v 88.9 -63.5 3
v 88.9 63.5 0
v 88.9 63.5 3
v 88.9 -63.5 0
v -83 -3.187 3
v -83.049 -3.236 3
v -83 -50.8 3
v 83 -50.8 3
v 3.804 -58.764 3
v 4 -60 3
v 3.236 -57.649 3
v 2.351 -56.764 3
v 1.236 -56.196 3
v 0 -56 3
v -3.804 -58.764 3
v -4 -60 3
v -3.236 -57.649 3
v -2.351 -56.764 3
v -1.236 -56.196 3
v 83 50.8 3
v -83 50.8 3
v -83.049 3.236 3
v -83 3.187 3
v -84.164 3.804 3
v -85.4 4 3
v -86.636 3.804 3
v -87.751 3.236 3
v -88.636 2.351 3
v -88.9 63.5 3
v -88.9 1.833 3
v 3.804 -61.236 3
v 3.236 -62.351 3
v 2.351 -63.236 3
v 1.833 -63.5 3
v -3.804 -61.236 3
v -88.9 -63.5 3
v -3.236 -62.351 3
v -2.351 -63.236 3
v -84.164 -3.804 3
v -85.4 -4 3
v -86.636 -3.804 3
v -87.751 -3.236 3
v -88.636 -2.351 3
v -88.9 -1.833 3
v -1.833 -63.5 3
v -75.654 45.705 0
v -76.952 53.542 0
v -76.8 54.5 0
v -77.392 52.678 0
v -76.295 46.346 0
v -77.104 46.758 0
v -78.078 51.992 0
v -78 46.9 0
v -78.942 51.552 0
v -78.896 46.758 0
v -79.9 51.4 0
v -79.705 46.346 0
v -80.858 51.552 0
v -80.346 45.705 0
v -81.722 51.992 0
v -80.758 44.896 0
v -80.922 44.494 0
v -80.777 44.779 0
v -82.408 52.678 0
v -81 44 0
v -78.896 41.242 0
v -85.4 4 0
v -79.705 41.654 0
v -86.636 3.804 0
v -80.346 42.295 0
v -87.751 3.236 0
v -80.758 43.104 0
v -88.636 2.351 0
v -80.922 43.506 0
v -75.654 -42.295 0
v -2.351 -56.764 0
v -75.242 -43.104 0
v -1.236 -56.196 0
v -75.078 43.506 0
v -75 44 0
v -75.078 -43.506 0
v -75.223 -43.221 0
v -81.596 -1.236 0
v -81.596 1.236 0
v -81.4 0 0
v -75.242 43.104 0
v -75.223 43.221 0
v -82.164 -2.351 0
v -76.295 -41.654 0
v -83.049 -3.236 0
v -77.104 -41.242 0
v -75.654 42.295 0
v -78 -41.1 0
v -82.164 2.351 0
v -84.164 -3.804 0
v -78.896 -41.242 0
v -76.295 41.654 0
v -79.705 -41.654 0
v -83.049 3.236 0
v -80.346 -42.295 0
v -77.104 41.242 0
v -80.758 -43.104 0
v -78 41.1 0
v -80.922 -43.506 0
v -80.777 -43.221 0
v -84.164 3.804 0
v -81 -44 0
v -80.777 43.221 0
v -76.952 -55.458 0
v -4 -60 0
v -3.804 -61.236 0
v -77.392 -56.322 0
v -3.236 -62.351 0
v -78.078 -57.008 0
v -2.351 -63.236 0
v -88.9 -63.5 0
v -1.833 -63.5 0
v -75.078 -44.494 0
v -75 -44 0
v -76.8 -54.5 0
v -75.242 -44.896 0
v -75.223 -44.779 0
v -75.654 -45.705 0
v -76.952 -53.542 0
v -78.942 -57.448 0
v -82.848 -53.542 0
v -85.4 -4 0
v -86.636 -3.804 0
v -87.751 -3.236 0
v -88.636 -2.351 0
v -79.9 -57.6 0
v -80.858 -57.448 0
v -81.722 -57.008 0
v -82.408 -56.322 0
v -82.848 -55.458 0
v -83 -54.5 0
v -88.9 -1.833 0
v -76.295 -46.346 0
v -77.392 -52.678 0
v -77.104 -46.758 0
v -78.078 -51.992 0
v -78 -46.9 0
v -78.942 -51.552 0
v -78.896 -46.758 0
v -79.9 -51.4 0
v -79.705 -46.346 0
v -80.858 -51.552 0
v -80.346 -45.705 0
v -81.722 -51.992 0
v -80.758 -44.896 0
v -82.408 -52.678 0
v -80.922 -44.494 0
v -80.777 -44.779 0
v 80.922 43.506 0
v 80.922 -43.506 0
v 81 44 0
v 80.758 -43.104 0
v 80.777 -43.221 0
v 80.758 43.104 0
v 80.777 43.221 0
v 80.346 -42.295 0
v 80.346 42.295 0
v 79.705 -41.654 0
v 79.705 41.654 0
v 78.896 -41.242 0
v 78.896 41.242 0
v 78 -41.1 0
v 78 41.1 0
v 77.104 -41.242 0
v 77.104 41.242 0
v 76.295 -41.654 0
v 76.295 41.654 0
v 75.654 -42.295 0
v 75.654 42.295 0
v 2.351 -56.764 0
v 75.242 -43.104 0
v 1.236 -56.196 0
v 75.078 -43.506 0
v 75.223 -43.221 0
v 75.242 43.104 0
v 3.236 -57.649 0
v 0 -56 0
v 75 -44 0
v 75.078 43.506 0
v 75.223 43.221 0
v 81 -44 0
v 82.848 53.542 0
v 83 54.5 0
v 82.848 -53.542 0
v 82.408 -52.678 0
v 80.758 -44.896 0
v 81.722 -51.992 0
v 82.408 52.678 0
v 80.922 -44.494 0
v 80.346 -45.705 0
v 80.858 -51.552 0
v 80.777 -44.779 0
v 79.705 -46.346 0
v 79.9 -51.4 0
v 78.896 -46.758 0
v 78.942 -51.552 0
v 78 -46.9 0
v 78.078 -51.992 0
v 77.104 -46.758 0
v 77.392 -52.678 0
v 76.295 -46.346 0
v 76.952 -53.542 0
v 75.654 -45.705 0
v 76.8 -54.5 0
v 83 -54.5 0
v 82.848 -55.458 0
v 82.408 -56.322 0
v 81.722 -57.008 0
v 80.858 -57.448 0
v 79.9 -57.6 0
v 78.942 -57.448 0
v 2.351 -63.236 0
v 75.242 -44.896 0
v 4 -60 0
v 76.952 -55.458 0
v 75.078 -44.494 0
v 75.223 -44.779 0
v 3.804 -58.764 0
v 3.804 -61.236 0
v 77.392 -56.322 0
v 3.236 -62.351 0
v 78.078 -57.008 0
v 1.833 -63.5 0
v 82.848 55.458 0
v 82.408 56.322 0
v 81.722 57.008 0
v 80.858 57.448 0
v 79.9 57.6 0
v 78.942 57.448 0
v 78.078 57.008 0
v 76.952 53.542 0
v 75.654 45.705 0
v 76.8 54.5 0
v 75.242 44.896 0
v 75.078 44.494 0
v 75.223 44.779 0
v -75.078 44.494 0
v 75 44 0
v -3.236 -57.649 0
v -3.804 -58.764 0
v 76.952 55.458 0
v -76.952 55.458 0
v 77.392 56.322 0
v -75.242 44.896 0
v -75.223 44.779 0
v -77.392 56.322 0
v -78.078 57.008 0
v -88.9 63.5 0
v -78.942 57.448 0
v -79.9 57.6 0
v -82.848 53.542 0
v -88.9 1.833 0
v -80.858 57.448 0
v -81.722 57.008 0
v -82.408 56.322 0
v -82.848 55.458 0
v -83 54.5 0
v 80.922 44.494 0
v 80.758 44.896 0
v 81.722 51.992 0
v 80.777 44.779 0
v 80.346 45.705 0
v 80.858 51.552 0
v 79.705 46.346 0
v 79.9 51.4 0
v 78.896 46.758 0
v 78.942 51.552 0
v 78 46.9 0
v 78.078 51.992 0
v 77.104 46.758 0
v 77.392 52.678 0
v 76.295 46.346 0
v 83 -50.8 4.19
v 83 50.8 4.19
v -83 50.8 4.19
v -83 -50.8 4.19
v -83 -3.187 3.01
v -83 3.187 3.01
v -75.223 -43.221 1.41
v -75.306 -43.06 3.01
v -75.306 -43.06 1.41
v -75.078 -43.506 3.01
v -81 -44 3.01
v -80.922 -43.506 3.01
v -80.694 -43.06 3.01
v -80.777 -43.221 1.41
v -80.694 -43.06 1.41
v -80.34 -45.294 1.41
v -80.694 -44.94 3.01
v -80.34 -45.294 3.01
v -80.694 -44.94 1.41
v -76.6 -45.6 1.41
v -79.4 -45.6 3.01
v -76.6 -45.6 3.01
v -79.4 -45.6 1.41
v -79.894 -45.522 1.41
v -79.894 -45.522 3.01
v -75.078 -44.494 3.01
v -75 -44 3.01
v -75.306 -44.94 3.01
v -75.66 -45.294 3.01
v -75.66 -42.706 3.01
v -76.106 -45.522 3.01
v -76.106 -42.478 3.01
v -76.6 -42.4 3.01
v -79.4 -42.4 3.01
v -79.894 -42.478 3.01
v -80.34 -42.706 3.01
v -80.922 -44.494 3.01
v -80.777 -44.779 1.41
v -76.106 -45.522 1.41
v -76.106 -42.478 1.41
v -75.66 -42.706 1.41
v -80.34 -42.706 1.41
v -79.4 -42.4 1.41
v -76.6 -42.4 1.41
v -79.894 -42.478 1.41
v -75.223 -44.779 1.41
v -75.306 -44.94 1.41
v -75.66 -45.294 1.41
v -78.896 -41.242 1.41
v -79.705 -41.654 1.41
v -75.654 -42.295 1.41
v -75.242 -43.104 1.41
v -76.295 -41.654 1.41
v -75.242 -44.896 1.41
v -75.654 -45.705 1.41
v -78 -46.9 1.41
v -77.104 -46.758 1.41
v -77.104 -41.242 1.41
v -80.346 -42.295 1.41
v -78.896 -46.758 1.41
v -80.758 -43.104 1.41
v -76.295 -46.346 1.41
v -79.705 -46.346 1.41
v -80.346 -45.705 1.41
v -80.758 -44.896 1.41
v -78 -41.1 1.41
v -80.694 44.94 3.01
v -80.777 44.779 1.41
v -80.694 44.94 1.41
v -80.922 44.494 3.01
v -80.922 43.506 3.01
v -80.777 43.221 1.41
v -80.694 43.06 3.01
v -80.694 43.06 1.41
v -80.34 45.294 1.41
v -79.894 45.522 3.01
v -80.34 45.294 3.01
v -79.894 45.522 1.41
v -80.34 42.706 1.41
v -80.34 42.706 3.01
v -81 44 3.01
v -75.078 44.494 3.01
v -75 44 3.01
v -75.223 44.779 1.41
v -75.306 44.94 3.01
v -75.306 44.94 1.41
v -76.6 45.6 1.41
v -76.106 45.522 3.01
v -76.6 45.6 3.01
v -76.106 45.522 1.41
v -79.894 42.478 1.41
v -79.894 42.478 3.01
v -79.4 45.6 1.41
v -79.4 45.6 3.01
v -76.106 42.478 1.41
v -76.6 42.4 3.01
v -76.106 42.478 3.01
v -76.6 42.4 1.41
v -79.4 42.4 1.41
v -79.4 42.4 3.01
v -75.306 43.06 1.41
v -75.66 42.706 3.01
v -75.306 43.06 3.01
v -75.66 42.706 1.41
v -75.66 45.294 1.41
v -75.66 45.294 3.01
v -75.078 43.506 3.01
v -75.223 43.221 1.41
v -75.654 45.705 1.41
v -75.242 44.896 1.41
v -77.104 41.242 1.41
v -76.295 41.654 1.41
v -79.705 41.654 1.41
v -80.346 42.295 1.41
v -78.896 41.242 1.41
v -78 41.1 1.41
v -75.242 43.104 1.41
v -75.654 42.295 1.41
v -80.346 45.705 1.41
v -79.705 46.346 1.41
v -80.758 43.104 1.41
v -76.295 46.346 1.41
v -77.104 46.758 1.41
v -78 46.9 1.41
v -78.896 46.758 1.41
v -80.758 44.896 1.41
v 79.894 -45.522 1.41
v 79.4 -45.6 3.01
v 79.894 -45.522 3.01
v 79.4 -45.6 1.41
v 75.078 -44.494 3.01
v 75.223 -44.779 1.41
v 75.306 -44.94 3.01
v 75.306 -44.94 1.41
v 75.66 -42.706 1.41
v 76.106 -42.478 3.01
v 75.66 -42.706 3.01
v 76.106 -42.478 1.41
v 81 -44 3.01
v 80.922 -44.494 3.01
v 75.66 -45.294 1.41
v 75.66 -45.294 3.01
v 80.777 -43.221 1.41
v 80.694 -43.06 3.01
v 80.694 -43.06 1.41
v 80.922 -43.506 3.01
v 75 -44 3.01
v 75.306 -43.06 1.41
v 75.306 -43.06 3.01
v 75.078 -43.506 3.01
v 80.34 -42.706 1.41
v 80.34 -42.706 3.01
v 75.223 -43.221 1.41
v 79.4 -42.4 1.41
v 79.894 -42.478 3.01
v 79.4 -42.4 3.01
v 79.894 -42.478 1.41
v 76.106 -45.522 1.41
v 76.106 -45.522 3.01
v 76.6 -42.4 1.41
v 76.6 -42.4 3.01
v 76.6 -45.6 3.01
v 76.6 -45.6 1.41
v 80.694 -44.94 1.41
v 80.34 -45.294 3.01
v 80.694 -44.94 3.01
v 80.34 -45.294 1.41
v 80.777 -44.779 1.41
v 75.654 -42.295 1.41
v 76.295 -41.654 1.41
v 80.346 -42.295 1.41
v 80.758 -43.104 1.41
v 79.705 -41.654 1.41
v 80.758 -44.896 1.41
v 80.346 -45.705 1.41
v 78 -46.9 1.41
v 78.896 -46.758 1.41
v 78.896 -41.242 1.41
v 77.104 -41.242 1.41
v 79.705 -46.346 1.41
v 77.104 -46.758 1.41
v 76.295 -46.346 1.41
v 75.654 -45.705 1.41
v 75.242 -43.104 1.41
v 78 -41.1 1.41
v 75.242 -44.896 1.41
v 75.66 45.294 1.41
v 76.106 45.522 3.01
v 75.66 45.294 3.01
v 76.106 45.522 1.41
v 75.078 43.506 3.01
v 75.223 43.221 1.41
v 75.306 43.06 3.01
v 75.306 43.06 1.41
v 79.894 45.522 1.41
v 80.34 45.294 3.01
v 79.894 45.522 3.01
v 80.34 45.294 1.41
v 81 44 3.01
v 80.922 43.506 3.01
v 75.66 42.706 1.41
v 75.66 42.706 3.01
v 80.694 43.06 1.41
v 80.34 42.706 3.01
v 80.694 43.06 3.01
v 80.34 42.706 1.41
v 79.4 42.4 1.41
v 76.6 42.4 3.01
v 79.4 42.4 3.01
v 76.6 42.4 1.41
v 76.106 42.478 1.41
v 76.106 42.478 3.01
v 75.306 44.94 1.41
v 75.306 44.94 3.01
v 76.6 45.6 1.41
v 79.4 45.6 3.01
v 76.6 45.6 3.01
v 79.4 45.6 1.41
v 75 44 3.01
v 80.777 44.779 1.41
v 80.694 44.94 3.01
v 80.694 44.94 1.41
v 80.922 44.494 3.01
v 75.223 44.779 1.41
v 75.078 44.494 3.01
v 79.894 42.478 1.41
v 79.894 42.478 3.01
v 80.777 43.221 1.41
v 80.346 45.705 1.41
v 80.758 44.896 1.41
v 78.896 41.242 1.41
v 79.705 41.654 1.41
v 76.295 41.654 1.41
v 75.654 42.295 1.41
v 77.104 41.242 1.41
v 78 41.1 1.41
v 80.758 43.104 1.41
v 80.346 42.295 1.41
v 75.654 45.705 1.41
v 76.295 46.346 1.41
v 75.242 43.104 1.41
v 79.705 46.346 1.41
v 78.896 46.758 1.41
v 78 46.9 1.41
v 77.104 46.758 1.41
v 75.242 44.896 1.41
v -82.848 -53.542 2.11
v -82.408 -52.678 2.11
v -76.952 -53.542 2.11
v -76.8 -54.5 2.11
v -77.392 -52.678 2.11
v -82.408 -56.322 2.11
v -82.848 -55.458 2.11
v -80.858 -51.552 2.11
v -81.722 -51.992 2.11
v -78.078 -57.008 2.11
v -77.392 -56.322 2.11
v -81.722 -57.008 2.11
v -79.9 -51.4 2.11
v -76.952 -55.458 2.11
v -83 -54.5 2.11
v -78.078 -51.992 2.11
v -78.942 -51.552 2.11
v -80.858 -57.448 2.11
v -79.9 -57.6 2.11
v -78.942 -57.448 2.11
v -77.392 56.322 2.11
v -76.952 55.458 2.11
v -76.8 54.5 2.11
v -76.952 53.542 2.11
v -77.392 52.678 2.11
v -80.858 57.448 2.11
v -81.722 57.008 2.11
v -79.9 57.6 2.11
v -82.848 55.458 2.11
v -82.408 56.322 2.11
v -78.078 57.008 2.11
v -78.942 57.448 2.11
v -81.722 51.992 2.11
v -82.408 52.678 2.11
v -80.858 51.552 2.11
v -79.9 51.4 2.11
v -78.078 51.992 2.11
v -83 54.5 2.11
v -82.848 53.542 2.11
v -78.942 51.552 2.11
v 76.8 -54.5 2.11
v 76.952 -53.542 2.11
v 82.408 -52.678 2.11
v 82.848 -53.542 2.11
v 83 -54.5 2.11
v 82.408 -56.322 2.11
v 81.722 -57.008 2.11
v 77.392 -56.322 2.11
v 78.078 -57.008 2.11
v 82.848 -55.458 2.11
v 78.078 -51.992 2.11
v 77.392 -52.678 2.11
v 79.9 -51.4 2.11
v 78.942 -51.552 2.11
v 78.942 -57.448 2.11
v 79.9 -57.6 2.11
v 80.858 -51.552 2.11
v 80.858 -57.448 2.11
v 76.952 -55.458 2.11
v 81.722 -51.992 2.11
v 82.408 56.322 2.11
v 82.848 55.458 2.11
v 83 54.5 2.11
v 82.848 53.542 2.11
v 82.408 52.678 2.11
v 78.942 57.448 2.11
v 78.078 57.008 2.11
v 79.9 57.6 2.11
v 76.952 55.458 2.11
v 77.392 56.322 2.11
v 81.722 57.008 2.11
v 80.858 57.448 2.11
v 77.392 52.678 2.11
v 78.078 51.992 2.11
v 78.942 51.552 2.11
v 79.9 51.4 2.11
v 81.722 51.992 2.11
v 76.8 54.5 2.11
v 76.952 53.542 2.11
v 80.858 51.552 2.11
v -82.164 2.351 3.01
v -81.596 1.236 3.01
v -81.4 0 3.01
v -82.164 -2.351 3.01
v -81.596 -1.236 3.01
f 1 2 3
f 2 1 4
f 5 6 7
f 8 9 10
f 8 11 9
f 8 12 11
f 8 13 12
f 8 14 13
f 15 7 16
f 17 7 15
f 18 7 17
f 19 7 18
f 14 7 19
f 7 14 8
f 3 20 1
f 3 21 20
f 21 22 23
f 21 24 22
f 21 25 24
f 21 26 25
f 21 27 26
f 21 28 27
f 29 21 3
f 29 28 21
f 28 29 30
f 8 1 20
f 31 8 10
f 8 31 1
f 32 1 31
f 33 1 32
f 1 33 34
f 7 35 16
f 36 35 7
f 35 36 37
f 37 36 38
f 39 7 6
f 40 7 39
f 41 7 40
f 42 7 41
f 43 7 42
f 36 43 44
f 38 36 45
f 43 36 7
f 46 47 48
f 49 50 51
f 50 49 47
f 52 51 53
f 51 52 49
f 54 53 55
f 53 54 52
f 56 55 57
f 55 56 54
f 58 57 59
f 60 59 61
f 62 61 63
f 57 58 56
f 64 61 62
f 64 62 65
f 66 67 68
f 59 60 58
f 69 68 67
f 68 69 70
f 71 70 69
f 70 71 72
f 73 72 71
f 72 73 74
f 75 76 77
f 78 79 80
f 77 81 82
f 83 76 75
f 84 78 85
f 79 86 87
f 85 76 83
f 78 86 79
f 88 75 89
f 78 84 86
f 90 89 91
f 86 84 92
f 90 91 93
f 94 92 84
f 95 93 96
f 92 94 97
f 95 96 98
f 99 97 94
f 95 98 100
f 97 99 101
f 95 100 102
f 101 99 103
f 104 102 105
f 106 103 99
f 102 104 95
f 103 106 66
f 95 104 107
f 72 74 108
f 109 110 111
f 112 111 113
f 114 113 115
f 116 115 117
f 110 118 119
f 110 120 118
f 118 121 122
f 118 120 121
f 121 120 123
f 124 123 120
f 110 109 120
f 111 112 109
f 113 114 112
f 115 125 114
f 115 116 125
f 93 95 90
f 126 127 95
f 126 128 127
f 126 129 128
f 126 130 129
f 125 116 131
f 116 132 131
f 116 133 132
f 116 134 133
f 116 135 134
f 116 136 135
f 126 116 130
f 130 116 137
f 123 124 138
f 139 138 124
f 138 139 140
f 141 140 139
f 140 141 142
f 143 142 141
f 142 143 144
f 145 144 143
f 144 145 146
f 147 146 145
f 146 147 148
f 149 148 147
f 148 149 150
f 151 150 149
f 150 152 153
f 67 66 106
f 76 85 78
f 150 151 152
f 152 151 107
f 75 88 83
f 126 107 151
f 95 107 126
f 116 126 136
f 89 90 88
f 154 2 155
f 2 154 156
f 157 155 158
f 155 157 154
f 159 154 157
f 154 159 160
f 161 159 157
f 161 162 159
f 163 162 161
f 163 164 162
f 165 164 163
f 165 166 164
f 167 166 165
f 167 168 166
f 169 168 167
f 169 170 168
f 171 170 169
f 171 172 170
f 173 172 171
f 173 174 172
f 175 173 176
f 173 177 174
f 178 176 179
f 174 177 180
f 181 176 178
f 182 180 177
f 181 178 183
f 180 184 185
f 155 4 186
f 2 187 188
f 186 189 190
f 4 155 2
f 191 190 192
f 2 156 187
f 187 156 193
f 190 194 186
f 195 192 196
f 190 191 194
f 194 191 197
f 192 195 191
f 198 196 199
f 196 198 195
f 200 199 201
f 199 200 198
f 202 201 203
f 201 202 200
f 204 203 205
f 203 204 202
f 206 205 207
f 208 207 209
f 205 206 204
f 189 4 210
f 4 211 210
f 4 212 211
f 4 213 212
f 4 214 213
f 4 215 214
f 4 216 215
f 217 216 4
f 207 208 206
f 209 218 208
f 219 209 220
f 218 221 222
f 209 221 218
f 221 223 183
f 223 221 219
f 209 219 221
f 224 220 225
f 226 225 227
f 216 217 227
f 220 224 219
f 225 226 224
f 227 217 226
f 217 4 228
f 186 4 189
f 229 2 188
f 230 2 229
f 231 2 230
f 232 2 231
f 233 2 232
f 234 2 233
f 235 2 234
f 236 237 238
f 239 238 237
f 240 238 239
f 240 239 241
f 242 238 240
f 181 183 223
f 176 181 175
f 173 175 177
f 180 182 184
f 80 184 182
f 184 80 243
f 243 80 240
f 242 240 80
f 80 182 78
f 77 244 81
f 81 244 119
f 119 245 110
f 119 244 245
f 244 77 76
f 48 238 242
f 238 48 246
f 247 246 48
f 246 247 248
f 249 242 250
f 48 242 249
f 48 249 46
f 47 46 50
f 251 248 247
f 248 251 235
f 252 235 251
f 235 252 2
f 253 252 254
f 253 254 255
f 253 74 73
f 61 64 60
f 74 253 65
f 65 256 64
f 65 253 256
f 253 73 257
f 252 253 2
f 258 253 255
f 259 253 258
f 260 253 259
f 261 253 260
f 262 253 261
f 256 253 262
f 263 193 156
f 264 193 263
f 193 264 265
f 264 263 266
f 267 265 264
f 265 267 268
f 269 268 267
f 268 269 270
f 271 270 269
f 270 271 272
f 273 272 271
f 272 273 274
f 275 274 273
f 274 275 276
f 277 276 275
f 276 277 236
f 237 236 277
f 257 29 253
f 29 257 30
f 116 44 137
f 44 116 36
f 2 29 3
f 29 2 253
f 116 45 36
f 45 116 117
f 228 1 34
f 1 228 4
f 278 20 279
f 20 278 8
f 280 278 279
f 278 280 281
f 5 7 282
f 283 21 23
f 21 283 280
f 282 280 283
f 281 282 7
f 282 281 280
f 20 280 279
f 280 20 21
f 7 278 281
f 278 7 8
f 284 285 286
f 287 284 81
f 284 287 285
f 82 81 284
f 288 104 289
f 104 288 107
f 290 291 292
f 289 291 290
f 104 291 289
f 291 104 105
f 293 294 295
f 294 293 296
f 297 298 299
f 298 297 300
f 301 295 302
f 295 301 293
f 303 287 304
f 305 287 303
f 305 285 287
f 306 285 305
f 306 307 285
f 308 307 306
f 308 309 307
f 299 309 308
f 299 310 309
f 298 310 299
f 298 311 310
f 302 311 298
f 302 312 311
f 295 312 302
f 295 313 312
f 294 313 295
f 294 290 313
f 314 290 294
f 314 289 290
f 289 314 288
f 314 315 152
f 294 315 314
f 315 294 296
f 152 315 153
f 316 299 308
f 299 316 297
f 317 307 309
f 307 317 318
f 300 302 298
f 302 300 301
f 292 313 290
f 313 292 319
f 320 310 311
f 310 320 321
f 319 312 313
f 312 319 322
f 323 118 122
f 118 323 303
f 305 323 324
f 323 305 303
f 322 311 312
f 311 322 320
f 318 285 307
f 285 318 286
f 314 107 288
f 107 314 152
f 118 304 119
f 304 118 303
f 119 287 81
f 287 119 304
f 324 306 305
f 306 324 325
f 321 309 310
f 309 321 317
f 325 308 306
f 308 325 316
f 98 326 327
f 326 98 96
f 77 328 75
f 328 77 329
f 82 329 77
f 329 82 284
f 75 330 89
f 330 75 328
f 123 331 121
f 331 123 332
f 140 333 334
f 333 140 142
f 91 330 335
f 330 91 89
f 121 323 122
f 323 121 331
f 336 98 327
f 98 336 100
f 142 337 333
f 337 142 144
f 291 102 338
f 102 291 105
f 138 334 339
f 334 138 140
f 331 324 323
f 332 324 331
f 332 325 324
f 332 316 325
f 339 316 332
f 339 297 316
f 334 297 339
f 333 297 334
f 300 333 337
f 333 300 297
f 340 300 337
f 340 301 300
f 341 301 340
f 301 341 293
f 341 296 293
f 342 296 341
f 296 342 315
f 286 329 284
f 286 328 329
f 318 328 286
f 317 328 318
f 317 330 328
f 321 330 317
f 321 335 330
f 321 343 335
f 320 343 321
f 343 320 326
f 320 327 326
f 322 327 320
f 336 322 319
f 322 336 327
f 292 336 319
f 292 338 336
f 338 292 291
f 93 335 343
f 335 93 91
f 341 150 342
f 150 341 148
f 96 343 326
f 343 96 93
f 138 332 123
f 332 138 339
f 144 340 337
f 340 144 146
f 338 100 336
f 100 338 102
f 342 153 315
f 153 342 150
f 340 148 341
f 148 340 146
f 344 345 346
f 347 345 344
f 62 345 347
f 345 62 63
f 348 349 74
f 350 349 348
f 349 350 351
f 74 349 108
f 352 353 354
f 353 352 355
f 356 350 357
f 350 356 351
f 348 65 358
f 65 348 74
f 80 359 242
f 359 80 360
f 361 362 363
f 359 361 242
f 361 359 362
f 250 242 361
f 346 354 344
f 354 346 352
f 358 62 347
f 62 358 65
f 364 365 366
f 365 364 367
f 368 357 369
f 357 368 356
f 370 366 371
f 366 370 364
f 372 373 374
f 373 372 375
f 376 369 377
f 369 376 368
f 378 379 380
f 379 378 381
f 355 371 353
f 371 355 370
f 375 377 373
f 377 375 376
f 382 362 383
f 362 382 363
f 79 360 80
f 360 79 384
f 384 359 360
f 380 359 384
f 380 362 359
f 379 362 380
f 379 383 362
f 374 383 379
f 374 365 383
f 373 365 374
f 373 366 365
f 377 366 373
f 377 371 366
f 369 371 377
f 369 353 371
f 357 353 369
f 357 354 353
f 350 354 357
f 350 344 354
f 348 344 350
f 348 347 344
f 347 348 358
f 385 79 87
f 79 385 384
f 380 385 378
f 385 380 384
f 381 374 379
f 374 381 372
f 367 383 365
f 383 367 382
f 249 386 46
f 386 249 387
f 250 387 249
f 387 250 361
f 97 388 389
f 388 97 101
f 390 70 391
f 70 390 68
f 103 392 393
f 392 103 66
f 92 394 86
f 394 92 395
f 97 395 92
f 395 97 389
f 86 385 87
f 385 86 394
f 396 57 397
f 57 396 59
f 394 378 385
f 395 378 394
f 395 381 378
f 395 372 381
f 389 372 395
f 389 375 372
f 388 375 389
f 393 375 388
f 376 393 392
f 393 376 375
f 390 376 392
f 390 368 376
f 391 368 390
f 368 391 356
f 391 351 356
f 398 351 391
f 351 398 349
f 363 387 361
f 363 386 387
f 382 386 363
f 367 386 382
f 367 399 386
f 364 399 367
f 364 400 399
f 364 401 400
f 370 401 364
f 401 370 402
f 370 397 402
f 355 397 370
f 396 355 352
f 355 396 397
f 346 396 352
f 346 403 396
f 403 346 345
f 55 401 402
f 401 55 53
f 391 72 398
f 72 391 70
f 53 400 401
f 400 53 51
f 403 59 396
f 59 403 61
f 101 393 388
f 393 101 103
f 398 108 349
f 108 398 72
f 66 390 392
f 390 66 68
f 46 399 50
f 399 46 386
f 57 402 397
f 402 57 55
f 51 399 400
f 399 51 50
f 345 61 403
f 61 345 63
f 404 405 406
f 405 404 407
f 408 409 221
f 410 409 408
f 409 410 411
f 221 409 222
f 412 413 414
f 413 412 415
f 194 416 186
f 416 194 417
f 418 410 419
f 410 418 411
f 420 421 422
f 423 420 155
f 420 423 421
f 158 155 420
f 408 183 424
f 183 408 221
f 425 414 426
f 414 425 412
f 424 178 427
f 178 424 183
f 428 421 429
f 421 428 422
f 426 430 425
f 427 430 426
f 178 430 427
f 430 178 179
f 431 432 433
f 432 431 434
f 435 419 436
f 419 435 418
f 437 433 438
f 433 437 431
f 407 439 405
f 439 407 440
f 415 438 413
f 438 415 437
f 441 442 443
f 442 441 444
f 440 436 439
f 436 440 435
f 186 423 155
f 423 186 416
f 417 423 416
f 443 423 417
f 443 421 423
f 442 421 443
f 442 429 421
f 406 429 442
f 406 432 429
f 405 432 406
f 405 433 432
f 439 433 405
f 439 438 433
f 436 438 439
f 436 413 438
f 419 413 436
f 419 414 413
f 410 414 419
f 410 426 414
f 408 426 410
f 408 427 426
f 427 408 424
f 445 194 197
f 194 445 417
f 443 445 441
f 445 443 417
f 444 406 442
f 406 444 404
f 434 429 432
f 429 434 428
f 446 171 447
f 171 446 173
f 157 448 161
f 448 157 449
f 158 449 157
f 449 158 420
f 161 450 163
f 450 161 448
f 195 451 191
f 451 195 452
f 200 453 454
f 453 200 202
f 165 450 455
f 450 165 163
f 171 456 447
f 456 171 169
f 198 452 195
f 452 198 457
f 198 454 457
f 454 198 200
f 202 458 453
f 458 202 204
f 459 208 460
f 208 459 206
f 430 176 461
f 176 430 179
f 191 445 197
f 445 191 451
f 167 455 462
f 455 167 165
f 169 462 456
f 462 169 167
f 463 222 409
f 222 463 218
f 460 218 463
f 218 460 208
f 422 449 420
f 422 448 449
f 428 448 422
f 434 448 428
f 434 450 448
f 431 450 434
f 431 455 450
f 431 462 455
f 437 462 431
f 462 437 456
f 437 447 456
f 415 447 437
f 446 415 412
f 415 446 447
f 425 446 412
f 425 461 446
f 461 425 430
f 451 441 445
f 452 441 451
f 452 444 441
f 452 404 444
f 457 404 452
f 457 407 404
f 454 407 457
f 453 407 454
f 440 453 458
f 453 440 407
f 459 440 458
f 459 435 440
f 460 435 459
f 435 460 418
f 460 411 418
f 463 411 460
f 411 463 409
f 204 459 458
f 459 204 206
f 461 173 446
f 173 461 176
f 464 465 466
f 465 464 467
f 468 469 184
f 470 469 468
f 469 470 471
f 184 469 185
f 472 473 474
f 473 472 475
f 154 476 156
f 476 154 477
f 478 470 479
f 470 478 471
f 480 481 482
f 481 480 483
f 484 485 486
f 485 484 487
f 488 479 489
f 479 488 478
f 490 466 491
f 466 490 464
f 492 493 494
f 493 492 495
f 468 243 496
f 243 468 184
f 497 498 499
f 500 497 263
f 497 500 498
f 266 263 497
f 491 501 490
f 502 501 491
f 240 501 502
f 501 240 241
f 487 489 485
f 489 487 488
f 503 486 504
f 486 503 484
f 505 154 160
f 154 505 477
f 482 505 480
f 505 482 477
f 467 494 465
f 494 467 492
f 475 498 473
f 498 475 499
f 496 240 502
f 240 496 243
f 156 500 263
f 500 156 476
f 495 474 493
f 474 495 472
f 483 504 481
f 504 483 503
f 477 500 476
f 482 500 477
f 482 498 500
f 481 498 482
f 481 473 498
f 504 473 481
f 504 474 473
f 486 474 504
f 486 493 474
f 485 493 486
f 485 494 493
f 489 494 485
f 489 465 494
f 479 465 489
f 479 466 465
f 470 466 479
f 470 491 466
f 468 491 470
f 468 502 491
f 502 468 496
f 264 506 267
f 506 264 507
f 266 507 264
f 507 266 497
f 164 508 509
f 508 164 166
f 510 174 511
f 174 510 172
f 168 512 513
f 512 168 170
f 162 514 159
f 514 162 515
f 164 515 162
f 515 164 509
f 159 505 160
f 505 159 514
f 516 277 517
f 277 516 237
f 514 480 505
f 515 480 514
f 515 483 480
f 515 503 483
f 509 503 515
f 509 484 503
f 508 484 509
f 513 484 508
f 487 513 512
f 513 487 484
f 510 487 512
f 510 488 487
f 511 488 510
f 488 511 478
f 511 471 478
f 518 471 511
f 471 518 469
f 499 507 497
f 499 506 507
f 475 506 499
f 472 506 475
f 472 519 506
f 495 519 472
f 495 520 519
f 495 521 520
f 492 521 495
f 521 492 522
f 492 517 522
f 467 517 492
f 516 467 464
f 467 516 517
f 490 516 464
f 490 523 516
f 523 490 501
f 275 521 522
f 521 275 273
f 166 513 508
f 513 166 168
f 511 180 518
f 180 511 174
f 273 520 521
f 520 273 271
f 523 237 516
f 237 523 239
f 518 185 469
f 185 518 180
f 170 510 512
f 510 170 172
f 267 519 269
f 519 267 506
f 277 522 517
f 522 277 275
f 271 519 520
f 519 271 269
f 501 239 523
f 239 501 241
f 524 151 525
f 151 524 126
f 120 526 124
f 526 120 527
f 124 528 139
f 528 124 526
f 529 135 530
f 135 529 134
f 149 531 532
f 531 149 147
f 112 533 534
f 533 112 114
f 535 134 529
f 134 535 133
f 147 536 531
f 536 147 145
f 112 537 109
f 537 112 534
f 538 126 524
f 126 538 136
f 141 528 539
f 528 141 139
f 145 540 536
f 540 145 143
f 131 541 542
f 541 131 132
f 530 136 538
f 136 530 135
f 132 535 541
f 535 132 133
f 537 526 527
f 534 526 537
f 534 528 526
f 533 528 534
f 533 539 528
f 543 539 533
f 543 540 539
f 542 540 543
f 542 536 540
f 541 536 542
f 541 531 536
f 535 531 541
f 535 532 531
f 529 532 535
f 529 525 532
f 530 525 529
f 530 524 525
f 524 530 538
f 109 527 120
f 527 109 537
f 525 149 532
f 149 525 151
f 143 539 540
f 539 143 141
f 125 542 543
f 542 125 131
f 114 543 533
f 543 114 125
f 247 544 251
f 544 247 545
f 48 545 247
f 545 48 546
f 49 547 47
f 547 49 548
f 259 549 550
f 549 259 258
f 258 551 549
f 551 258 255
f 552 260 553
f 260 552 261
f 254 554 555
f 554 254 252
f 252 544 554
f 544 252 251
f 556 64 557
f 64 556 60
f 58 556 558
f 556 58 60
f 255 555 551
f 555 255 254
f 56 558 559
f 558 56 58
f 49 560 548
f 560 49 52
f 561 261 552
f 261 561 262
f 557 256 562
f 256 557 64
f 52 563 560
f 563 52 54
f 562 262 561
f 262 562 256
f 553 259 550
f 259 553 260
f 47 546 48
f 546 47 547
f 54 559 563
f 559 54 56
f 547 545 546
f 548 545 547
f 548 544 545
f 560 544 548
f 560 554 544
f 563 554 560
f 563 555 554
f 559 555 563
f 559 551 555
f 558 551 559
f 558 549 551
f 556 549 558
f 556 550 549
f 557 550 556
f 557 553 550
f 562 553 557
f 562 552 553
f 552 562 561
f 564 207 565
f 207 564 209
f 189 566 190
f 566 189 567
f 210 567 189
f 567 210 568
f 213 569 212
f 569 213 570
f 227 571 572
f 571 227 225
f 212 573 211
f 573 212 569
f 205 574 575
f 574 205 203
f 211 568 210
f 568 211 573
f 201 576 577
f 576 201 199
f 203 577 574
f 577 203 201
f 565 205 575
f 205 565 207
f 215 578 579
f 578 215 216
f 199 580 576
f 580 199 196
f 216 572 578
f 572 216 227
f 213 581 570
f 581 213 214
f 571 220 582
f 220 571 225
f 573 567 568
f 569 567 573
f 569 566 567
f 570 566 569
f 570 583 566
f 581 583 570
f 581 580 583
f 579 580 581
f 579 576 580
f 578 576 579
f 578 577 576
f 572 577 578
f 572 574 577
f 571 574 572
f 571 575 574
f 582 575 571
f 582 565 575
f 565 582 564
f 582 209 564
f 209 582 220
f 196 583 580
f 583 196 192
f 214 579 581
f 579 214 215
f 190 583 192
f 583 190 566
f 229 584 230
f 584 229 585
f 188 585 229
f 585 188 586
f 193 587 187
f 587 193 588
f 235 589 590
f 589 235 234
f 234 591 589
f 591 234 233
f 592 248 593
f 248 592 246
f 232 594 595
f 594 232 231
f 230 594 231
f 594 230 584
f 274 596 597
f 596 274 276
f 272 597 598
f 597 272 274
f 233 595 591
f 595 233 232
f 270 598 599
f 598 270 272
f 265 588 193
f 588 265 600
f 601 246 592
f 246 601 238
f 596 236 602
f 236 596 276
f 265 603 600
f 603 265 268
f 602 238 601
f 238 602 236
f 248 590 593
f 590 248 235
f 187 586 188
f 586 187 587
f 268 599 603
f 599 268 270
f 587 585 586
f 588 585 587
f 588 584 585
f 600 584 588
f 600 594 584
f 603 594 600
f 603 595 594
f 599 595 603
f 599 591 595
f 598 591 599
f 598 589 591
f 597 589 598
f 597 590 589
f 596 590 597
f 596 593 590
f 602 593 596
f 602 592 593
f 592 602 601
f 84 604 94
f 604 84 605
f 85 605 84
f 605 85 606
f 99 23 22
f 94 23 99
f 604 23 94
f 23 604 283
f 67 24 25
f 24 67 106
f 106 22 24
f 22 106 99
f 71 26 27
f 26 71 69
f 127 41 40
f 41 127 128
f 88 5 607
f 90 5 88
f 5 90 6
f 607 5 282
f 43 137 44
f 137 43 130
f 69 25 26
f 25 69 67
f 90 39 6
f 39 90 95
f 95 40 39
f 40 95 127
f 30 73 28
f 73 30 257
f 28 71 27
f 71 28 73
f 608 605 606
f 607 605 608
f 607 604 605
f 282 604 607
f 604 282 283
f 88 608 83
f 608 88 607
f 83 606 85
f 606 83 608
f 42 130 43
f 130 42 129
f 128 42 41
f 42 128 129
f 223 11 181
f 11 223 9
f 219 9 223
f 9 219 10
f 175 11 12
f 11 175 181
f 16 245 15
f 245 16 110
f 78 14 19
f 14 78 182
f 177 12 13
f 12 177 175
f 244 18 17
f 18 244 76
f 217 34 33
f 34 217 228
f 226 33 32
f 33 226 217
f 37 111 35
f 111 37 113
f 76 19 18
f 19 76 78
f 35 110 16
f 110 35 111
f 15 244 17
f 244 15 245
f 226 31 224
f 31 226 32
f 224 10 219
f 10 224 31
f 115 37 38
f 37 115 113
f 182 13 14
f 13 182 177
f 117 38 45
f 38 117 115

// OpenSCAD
// Luminary 7-inch P4 rear mounting plate — production export.
// Matte-black PLA; dimensions in millimetres. Export directly to STL.
//
// Confirmed P4 envelope: PCB 164 x 97 mm; LCD/bezel 164.28 x 99.17 mm.
// The mounting pattern uses 6 x 3.2 mm tolerance slots for M2.5 fasteners
// because the vendor image does not certify exact hole-center coordinates.

$fn = 20;

plate_w = 177.8;  // 7 in
plate_h = 127.0;  // 5 in
plate_t = 3.0;

p4_land_w = 166.0;
p4_land_h = 101.6;
p4_land_t = 1.2;

slot_dx = 78.0;
slot_dy = 44.0;
slot_len = 6.0;
slot_d = 3.2;
counterbore_d = 5.8;
counterbore_t = 1.4;

magnet_d = 6.2;       // 6 mm nominal disc magnet clearance
magnet_t = 2.1;       // 2 mm nominal disc magnet clearance
magnet_dx = plate_w / 2 - 9.0;
magnet_dy = plate_h / 2 - 9.0;

cable_d = 8.0;

module rounded_plate() {
    // The wood shadow box hides the plate perimeter, so a plain rectangular
    // envelope is both stronger and much faster to compile than cosmetic
    // corner fillets.
    translate([-plate_w / 2, -plate_h / 2, 0]) cube([plate_w, plate_h, plate_t]);
}

module pill_slot(length, diameter) {
    hull() {
        translate([-(length - diameter) / 2, 0]) circle(d = diameter);
        translate([(length - diameter) / 2, 0]) circle(d = diameter);
    }
}

module p4_fastener(x, y) {
    translate([x, y, -0.01]) linear_extrude(height = plate_t + 0.02)
        pill_slot(slot_len, slot_d);
    // Recess the screw head on the rear face so it does not stand off from the
    // wooden frame or its steel attachment squares.
    translate([x, y, -0.01]) cylinder(d = counterbore_d, h = counterbore_t + 0.02);
}

module backplate() {
    difference() {
        union() {
            rounded_plate();
            translate([-p4_land_w / 2, -p4_land_h / 2, plate_t - 0.01])
                cube([p4_land_w, p4_land_h, p4_land_t]);
        }
        for (x = [-slot_dx, slot_dx])
            for (y = [-slot_dy, slot_dy]) p4_fastener(x, y);

        // Four rear-facing pockets accept magnets that couple to steel squares
        // fixed inside the shadow-box frame.
        for (x = [-magnet_dx, magnet_dx])
            for (y = [-magnet_dy, magnet_dy])
                translate([x, y, -0.01]) cylinder(d = magnet_d, h = magnet_t + 0.02);

        // Either cable route can be used: side for a wall install, bottom for
        // a tabletop orientation. The unused opening remains behind the box.
        translate([-plate_w / 2 + 3.5, 0, -0.01]) cylinder(d = cable_d, h = plate_t + 0.02);
        translate([0, -plate_h / 2 + 3.5, -0.01]) cylinder(d = cable_d, h = plate_t + 0.02);
    }
}

backplate();
